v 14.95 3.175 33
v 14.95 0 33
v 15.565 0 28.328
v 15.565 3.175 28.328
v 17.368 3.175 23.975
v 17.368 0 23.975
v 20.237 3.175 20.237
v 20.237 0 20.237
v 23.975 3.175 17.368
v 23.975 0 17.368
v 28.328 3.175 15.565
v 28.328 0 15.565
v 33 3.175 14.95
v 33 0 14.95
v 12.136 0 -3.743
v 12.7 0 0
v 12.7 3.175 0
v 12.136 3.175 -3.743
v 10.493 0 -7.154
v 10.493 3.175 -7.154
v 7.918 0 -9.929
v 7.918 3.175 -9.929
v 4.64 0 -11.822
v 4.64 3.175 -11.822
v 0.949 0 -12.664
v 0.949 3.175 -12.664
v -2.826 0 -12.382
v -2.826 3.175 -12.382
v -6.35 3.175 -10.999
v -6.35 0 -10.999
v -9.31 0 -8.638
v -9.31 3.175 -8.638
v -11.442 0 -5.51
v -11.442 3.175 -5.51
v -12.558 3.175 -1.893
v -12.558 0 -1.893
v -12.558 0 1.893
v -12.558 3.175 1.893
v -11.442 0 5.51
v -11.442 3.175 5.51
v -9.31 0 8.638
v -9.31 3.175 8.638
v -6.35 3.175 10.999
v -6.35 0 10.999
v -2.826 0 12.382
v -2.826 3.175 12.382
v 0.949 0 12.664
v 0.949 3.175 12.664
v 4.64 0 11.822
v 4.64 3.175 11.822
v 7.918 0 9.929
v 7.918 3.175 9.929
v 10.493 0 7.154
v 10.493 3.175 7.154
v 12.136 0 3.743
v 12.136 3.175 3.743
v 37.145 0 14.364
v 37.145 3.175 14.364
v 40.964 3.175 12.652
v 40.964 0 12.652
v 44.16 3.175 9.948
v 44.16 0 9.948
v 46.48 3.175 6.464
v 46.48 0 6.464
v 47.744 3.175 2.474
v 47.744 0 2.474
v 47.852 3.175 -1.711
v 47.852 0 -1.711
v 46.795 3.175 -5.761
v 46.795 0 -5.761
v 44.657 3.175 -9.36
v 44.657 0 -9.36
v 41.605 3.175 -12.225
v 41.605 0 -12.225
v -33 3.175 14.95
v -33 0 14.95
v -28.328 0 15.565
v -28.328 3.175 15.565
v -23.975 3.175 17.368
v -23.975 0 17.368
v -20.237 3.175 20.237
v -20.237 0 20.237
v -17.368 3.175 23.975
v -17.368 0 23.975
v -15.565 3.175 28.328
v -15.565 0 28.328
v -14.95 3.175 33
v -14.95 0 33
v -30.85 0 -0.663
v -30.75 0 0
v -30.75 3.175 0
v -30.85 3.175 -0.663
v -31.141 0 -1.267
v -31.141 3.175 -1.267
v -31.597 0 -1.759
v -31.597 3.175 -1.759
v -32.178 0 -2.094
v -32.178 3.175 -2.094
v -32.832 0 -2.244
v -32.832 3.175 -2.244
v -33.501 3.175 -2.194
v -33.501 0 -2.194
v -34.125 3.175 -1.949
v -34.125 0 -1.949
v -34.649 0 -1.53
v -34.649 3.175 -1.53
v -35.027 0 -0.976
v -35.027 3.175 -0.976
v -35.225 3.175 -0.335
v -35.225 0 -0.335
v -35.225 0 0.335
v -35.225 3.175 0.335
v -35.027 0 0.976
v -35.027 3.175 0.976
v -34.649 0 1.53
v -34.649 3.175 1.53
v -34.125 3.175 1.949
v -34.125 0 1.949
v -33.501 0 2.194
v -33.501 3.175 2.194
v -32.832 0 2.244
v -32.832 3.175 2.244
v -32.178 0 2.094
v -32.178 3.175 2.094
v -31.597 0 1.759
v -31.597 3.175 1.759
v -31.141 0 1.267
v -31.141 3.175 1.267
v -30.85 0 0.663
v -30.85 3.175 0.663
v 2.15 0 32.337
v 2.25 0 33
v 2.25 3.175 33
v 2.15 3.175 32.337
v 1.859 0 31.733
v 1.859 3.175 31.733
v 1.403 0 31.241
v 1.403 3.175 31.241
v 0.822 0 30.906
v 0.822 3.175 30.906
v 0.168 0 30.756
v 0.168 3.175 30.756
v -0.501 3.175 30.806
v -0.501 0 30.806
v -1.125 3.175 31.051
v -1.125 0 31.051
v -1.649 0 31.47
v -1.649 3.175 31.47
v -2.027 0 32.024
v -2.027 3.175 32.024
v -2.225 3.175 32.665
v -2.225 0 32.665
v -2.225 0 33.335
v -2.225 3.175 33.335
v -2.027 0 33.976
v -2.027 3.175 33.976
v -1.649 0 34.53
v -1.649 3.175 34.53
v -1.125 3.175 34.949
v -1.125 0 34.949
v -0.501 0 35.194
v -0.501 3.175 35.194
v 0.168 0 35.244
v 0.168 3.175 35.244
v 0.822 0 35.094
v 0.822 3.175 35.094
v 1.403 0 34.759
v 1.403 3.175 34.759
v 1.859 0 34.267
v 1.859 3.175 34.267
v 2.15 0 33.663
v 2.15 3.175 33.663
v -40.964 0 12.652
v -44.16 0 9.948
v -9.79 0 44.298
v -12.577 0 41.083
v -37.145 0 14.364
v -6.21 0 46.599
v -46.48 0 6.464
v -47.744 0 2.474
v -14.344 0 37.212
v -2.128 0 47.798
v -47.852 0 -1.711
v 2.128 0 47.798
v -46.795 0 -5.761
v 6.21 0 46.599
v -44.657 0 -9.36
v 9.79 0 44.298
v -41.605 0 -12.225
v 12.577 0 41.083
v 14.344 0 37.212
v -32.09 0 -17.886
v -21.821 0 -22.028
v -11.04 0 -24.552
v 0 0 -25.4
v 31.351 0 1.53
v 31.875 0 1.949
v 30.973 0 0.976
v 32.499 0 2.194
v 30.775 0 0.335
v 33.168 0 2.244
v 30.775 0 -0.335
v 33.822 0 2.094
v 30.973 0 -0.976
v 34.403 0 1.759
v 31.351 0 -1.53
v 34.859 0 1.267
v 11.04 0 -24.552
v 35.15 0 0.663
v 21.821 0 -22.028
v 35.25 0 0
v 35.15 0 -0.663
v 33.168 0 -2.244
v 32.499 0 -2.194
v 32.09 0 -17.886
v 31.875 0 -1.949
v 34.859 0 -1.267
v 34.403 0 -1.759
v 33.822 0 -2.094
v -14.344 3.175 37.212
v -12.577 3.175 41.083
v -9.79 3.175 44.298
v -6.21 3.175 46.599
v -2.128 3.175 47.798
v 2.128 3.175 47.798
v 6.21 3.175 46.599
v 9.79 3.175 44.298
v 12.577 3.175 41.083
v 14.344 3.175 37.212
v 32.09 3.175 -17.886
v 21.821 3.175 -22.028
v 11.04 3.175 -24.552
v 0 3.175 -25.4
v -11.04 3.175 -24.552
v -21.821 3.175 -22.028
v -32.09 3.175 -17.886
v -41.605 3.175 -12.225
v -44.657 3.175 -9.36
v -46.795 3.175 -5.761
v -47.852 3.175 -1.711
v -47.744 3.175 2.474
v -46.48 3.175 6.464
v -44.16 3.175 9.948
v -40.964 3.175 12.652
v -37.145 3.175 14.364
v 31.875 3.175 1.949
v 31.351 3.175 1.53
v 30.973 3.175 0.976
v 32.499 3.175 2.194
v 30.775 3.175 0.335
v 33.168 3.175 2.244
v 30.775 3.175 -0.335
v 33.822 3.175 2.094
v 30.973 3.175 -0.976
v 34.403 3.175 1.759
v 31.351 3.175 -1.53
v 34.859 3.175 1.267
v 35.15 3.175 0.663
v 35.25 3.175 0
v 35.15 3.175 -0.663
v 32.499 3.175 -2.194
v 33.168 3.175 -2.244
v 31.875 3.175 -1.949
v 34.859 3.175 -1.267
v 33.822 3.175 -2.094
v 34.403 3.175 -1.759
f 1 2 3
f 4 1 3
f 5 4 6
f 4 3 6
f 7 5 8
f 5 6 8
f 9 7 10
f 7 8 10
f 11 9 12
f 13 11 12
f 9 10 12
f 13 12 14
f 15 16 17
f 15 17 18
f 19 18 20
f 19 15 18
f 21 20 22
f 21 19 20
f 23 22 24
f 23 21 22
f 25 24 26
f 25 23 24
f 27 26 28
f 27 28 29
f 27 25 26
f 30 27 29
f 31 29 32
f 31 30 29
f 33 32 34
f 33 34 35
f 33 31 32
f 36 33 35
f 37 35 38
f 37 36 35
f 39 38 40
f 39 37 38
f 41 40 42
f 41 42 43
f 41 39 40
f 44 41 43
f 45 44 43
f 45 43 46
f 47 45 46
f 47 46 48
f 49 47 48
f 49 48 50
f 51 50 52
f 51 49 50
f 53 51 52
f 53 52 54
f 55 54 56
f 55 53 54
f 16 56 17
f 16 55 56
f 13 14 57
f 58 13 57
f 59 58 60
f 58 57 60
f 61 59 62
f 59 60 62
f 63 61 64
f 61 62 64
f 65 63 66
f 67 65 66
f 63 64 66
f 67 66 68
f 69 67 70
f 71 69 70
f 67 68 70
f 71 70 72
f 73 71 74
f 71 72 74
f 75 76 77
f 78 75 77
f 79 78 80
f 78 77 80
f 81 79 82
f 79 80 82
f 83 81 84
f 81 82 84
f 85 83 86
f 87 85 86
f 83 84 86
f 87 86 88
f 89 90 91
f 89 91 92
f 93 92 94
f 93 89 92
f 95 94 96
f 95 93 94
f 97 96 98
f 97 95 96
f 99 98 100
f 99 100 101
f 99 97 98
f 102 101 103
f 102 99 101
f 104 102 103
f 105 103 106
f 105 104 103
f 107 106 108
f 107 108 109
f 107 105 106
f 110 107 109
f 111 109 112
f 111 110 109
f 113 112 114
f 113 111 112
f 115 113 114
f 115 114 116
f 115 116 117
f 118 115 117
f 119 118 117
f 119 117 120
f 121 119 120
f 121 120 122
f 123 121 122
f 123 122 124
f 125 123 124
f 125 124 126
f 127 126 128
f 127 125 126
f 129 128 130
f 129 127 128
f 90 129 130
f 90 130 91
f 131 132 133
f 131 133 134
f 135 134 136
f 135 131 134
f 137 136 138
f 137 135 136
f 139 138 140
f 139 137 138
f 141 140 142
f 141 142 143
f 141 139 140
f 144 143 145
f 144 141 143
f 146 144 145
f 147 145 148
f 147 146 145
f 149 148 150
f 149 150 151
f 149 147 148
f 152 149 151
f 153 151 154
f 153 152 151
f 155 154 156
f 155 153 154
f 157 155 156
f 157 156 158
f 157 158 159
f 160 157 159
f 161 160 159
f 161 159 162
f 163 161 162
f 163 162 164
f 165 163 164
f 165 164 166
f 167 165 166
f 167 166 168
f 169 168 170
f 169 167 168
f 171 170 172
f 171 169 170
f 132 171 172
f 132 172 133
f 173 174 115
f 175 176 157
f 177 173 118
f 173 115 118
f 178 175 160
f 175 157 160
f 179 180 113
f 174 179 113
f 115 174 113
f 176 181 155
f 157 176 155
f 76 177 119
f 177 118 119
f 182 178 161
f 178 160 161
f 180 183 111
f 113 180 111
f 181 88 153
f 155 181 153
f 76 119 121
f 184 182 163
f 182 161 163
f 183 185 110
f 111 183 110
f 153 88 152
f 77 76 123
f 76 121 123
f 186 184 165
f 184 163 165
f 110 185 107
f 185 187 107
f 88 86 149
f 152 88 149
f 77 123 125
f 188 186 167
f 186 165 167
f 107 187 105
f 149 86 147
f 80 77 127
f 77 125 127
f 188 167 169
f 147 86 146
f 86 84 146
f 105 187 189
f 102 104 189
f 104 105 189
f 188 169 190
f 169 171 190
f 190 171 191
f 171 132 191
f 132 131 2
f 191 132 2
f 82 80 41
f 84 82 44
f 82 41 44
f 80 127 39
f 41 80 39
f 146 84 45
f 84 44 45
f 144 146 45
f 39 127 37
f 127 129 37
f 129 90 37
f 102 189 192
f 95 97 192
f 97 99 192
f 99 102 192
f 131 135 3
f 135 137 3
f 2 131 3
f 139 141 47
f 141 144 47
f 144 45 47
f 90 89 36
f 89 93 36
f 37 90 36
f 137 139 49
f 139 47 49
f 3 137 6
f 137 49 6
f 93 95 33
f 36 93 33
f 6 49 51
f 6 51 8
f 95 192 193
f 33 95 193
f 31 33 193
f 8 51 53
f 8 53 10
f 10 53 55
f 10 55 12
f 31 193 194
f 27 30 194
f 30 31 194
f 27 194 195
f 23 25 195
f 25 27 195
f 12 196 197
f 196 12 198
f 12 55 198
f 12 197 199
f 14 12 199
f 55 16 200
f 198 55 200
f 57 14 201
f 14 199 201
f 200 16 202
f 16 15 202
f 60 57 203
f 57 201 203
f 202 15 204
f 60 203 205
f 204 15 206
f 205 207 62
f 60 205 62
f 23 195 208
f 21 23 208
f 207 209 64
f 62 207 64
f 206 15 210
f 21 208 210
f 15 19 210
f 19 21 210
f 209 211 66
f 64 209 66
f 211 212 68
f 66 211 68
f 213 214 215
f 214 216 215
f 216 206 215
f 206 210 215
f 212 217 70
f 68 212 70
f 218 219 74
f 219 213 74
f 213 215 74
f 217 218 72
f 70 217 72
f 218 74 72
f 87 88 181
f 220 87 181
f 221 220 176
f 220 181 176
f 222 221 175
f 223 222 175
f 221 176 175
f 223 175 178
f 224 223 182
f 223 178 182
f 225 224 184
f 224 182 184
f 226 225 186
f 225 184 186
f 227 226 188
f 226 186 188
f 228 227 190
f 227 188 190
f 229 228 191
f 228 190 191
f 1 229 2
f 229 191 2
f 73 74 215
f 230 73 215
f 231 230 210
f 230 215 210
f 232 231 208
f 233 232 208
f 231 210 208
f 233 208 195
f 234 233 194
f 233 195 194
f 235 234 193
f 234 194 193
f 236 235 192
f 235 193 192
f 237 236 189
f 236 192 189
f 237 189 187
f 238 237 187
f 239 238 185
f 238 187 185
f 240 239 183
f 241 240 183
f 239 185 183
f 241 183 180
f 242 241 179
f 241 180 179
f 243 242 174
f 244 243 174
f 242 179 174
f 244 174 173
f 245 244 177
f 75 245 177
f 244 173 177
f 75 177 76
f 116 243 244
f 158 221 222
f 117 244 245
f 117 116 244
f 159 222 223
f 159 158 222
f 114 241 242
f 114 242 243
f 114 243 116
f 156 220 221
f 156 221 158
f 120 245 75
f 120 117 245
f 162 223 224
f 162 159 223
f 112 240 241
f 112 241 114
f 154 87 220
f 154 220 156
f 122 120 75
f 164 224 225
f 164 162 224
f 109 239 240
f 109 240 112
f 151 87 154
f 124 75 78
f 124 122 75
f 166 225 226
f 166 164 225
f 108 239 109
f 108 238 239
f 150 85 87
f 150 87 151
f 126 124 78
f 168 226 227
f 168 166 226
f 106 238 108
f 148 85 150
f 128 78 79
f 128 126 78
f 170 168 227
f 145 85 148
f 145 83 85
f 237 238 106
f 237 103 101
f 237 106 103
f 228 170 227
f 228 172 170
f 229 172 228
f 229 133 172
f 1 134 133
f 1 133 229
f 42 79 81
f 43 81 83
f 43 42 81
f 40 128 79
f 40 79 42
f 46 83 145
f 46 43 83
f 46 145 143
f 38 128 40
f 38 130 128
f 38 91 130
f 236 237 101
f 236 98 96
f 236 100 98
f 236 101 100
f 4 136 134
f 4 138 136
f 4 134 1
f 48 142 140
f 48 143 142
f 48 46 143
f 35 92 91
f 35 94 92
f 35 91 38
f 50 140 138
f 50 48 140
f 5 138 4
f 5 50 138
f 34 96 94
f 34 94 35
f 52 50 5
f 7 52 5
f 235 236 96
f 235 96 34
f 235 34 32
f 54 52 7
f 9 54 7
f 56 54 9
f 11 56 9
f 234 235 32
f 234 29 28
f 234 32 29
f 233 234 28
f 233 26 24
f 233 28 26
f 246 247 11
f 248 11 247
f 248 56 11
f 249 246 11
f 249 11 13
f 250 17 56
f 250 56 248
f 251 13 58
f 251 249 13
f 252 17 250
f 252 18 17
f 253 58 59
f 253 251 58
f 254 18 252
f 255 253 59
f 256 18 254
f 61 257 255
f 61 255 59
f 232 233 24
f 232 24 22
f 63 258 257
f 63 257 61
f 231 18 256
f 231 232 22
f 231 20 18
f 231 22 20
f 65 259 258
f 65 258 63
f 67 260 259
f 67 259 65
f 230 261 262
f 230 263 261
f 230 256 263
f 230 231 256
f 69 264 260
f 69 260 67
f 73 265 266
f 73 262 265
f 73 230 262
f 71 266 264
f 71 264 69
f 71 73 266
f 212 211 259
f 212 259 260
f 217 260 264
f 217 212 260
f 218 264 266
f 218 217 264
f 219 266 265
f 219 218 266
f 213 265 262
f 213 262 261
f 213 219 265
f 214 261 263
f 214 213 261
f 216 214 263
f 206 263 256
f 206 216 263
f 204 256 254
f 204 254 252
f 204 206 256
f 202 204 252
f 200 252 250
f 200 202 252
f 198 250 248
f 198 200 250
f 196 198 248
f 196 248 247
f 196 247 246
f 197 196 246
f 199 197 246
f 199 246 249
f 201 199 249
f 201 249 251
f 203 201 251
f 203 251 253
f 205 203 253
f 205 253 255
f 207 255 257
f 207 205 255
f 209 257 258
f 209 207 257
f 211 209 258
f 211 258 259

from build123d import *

# Parameters (mm, degrees)
SKETCH1_R           = 12.7
SKETCH1_R_2         = 2.25
BOSS_EXTRUDE1_DEPTH = 3.175


with BuildPart() as part:
    # Sketch1 → Boss-Extrude1 (new body)
    with BuildSketch(Plane(origin=(0, 0, 0), x_dir=(1, 0, 0), z_dir=(0, 1, 0))):
        with BuildLine():
            ThreePointArc((-41.605402676, 12.224955819), (-47.252466269, -4.513280985), (-33, -14.95))
            ThreePointArc((-33, -14.95), (-20.2367226, -20.2367226), (-14.95, -33))
            ThreePointArc((-14.95, -33), (0, -47.95), (14.95, -33))
            ThreePointArc((14.95, -33), (20.2367226, -20.2367226), (33, -14.95))
            ThreePointArc((33, -14.95), (47.252466269, -4.513280985), (41.605402676, 12.224955819))
            ThreePointArc((41.605402676, 12.224955819), (0, 25.4), (-41.605402676, 12.224955819))
        make_face()
        Circle(SKETCH1_R, mode=Mode.SUBTRACT)
        with Locations((-33, 0)):
            Circle(SKETCH1_R_2, mode=Mode.SUBTRACT)
        with Locations((33, 0)):
            Circle(SKETCH1_R_2, mode=Mode.SUBTRACT)
        with Locations((0, -33)):
            Circle(SKETCH1_R_2, mode=Mode.SUBTRACT)
    extrude(amount=BOSS_EXTRUDE1_DEPTH)


solid = part.part
